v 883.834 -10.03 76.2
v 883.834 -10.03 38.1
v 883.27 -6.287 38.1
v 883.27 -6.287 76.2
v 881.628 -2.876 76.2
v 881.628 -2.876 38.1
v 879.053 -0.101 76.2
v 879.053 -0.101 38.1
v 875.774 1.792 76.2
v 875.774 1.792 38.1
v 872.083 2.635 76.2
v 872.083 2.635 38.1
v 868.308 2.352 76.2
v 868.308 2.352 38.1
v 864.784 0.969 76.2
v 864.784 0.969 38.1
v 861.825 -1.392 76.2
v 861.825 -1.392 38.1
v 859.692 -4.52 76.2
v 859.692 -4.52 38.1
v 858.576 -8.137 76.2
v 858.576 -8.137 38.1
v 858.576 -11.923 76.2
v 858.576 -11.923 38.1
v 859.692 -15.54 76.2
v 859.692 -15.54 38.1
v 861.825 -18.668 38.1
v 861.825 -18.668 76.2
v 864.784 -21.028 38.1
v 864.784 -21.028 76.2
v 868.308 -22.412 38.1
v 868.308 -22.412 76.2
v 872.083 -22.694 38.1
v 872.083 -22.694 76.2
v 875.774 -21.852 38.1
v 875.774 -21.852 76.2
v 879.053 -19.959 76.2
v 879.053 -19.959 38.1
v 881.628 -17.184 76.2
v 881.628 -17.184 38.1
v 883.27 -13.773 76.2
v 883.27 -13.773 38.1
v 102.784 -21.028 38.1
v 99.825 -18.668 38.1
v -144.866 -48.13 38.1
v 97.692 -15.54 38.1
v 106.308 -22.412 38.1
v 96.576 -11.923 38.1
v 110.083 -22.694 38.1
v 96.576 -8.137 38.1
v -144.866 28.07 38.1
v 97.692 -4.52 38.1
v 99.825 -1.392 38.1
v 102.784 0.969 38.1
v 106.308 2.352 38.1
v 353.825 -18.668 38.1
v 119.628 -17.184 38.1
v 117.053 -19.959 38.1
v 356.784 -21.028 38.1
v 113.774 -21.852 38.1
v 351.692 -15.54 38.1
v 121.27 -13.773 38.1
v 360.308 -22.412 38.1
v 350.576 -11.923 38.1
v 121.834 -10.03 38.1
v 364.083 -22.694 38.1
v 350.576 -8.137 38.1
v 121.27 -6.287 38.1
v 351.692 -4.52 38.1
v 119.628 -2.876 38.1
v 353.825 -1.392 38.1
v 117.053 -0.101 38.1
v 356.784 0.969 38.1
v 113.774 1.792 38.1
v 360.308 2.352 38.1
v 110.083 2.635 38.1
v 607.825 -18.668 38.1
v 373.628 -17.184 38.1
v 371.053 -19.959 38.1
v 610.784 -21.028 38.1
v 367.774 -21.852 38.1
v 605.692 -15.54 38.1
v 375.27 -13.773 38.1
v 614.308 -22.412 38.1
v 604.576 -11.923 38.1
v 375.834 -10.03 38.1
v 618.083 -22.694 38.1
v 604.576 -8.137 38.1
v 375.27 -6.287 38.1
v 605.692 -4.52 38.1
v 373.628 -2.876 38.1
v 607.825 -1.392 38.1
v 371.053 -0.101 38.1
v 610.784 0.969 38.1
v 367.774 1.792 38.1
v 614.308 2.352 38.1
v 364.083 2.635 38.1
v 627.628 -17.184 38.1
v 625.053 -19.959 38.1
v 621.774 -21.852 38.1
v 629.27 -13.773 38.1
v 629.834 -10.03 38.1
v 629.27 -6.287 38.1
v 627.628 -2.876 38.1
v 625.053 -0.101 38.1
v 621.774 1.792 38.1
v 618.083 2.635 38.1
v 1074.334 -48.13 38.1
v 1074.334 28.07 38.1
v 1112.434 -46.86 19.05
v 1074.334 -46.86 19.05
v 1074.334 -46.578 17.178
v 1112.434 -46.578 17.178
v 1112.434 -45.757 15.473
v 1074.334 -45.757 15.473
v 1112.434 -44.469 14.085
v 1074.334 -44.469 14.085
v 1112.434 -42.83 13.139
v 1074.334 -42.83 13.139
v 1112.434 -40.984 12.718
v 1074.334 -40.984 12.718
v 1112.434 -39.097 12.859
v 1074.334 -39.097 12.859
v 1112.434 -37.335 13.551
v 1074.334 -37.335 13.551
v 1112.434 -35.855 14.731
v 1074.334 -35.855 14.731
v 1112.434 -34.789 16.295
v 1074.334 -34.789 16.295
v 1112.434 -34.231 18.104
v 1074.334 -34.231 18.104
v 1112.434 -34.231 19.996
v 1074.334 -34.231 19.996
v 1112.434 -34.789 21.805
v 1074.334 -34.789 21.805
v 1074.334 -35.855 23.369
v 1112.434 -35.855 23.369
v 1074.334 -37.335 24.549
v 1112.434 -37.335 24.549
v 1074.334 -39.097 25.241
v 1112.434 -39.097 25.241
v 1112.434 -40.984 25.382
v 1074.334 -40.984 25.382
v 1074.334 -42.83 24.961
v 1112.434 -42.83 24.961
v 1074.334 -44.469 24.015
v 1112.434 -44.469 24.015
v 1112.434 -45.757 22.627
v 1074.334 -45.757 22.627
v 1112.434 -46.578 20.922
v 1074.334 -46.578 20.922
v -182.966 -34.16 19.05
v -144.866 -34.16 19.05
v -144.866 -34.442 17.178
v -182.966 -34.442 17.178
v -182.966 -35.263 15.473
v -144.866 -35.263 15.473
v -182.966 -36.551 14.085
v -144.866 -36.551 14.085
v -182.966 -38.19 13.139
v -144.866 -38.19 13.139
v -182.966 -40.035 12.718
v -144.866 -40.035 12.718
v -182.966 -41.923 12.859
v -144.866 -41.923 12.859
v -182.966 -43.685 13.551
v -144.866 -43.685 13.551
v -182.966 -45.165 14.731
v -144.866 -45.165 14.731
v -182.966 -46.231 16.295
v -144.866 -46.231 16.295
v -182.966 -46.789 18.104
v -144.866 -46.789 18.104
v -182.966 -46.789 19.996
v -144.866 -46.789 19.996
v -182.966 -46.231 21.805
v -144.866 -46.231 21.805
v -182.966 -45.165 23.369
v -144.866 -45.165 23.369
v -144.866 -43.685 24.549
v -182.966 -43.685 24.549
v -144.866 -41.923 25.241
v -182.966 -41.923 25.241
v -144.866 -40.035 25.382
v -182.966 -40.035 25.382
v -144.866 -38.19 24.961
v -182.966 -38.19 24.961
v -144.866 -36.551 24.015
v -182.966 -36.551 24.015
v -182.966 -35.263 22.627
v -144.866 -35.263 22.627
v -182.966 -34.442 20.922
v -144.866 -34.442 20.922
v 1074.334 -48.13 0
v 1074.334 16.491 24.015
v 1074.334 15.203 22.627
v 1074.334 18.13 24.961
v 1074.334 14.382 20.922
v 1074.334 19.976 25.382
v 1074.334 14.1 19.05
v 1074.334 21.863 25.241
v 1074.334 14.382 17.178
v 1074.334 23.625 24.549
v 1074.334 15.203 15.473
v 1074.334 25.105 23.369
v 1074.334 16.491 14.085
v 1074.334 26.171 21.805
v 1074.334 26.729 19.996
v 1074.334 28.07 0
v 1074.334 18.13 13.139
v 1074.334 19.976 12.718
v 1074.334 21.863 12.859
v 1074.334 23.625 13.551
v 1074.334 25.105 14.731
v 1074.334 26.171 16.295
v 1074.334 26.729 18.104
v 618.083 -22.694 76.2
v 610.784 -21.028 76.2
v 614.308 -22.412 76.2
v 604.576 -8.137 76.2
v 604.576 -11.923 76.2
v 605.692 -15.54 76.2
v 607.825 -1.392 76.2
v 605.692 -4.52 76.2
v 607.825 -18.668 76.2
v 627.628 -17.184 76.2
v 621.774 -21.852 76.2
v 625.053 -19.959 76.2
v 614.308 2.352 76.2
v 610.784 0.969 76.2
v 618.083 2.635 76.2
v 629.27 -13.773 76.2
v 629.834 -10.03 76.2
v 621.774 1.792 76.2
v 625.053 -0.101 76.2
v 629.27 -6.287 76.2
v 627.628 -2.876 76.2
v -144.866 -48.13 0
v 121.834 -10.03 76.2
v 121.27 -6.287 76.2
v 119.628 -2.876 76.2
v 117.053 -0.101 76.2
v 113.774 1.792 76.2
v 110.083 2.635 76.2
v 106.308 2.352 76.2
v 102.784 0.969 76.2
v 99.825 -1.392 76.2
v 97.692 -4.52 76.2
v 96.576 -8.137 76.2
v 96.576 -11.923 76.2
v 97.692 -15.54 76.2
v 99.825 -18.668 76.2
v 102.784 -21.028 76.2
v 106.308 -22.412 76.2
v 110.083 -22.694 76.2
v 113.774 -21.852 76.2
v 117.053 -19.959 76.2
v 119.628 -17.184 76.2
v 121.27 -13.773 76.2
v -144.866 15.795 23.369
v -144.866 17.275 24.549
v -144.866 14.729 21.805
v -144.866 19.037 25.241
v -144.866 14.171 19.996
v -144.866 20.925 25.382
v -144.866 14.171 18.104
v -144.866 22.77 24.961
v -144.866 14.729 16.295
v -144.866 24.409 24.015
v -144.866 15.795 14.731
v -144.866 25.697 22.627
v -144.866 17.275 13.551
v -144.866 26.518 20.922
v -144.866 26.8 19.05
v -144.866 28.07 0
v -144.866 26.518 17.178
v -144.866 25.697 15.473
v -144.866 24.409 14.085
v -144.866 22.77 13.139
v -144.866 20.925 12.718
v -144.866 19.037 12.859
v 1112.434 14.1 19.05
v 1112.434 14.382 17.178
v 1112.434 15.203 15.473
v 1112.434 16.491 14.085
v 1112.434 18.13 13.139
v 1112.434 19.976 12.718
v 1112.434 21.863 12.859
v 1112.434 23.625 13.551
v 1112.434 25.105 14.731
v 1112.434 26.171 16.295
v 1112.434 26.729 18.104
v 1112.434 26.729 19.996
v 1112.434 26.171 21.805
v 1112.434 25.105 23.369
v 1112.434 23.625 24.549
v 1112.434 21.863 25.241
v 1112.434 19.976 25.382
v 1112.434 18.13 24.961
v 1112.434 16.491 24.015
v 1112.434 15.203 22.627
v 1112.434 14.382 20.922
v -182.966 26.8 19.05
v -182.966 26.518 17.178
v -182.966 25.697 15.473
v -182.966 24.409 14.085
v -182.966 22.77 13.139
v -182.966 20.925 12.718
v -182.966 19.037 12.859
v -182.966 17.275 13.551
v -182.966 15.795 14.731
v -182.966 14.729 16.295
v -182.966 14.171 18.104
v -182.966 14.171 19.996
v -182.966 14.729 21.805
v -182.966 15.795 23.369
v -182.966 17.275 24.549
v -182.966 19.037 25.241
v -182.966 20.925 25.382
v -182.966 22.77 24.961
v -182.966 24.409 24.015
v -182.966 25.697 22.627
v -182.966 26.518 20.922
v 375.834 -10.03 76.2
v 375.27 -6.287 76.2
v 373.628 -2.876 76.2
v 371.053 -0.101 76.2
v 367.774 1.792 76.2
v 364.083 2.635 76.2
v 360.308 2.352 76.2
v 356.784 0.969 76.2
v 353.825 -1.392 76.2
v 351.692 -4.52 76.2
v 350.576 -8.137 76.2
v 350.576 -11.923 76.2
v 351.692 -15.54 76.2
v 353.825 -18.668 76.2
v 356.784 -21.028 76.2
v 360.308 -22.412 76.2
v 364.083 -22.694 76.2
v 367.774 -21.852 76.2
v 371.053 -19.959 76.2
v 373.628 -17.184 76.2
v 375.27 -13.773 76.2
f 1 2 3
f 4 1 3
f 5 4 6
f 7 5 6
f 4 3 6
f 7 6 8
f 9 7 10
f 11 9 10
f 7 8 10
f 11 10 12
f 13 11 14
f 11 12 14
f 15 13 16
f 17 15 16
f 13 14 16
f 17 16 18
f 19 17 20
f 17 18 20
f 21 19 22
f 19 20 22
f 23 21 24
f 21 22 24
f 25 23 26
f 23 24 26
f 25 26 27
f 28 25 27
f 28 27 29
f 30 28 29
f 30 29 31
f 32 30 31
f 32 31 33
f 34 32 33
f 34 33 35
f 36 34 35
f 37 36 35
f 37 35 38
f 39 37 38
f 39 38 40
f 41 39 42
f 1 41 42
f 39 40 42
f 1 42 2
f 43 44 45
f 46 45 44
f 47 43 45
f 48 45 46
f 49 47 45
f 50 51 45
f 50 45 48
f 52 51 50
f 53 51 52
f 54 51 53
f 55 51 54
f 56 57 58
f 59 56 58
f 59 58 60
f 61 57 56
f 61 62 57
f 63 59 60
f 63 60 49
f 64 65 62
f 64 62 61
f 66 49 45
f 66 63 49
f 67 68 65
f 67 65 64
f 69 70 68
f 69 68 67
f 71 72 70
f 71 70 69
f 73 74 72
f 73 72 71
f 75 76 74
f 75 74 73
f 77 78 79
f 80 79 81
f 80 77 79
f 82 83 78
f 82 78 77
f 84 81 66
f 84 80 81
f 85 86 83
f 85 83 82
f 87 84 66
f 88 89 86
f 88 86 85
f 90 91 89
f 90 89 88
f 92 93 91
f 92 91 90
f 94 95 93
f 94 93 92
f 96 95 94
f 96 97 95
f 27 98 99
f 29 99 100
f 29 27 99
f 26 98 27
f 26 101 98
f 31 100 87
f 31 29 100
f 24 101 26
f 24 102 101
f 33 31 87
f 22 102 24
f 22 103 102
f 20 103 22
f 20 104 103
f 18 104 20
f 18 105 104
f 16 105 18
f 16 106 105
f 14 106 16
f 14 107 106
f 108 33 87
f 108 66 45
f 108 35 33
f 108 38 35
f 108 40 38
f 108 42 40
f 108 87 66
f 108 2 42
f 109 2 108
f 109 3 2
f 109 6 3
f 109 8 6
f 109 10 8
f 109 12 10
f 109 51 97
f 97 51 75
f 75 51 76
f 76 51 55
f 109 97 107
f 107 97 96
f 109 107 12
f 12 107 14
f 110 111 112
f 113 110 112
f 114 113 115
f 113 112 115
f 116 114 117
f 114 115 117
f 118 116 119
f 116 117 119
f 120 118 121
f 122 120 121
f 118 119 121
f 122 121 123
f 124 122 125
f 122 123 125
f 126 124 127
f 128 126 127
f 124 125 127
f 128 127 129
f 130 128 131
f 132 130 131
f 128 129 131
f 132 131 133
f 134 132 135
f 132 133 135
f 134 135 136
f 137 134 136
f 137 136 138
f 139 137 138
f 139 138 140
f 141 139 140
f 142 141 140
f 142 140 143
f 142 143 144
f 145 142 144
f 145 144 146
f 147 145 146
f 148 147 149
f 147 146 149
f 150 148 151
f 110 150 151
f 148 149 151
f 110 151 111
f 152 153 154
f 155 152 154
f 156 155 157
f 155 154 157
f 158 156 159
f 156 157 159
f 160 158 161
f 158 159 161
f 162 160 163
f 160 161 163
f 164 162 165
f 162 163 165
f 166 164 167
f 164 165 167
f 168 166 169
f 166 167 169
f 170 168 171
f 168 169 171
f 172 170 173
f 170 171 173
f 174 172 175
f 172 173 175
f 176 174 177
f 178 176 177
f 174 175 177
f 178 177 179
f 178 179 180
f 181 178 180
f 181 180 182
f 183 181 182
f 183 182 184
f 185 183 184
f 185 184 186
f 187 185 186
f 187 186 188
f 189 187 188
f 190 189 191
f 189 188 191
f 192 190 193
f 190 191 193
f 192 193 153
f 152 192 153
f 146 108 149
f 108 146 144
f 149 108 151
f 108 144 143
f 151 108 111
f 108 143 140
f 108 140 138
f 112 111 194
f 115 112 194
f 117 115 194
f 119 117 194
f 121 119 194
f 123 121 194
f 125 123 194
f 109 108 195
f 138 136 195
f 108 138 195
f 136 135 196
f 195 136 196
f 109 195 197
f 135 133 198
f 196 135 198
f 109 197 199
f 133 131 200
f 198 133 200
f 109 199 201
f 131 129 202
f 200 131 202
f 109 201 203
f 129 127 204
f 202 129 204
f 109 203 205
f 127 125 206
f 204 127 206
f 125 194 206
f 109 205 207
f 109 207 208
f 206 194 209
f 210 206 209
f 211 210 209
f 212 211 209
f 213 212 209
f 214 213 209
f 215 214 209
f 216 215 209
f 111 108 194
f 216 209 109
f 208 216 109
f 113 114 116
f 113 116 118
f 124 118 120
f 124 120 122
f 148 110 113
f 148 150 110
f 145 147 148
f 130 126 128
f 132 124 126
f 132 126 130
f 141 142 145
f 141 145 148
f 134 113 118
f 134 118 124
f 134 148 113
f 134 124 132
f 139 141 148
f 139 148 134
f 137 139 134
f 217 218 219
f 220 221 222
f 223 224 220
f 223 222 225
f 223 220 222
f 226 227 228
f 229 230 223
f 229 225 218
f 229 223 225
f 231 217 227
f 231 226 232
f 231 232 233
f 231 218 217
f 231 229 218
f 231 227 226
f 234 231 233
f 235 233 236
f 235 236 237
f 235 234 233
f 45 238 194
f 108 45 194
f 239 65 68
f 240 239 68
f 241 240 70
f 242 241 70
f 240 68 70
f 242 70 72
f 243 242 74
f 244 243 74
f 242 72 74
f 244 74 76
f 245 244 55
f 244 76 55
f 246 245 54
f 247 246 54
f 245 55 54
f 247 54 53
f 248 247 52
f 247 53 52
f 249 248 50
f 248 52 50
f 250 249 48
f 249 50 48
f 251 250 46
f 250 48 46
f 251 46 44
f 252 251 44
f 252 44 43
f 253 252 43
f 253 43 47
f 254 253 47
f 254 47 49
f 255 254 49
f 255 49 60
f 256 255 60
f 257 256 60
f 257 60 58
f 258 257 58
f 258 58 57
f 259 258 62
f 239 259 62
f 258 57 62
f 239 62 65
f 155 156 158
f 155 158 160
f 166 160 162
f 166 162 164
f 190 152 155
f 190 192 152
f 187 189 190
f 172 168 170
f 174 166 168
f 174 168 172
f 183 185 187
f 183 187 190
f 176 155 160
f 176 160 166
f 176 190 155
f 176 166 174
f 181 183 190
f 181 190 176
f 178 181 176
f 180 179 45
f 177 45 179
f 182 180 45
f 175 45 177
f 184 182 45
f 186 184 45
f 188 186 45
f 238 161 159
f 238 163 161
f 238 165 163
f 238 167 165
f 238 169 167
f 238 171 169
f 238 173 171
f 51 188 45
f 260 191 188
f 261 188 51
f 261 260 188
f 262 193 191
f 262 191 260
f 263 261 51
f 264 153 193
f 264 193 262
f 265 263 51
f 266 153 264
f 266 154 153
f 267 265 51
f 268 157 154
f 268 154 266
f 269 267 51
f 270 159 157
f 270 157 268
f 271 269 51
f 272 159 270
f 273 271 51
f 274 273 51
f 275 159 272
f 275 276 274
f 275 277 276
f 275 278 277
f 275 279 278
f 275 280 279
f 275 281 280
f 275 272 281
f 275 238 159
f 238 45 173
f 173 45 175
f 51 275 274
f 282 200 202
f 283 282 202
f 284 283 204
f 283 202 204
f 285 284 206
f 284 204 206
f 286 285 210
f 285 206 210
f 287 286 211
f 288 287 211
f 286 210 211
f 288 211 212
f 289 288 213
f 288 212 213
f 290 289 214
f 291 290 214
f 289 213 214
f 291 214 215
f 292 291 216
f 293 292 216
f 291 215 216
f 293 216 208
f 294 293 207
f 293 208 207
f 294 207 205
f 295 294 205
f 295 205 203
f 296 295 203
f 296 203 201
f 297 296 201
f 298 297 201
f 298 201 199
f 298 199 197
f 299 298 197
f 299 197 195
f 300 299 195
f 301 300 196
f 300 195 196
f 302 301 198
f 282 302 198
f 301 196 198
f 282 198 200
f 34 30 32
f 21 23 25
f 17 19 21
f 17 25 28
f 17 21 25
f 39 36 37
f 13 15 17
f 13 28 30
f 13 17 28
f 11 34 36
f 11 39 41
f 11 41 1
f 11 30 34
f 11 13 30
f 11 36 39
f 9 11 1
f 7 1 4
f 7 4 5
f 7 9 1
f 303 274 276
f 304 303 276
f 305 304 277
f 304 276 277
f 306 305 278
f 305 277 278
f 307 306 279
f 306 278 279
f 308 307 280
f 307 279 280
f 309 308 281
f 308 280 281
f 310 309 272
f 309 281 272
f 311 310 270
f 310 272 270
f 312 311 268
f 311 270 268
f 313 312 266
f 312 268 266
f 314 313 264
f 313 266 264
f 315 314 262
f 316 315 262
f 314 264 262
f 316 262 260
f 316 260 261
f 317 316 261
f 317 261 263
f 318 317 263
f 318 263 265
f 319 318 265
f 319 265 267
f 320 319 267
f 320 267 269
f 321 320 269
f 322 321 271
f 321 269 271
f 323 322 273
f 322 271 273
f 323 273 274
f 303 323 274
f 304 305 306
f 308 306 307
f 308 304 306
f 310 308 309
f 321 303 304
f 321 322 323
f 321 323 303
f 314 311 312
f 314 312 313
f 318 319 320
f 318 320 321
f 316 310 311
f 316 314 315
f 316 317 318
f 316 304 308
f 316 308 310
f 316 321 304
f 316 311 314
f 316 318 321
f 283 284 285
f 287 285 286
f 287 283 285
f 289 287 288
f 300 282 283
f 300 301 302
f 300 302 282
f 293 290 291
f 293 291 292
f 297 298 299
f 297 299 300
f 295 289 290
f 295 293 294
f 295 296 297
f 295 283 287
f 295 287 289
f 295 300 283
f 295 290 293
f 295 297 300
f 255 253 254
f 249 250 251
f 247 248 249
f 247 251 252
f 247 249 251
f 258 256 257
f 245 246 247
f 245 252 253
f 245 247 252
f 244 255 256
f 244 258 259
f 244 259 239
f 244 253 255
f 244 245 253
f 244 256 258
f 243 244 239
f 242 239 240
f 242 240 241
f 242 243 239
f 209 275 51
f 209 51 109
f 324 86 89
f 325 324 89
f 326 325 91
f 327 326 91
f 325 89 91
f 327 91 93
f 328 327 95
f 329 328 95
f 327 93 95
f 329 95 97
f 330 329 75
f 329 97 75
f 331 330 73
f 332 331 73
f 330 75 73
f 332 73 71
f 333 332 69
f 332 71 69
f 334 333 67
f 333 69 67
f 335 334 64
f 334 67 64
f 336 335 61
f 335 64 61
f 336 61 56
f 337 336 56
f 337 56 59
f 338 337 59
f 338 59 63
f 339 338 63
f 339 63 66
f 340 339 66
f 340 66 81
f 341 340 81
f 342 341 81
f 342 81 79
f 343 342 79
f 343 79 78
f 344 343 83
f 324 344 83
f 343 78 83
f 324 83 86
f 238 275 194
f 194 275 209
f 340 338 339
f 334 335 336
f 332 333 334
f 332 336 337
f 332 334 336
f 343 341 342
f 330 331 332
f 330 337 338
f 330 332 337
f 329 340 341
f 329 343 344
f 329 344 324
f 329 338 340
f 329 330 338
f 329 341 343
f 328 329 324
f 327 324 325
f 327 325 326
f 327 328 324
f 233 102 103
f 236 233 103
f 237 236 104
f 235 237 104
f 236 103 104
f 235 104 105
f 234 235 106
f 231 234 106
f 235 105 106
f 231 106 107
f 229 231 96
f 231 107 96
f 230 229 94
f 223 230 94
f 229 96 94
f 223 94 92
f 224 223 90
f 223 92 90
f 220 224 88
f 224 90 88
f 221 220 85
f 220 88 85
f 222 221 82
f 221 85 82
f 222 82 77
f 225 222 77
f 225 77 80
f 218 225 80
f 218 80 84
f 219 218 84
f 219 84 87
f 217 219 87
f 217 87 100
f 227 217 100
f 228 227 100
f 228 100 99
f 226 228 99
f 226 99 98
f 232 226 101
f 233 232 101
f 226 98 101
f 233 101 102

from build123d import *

# Parameters (mm, degrees)
F0_W     = 1219.2
F0_H     = 76.2
F1_DEPTH = 38.1
F2_R     = 12.7
F3_DEPTH = 38.1
F5_DEPTH = 38.1
F7_DEPTH = 38.1


with BuildPart() as f1:
    # F0 (on Top) → F1 (new body)
    with BuildSketch(Plane.XY):
        with Locations((464.734342, -10.029948)):
            Rectangle(F0_W, F0_H)
    extrude(amount=F1_DEPTH)

    # F2 (on face) → F3 (join)
    with BuildSketch(Plane.XY.offset(38.1)):
        with Locations((109.134342, -10.029948)):
            Circle(F2_R)
        with Locations((363.134342, -10.029948)):
            Circle(F2_R)
        with Locations((617.134342, -10.029948)):
            Circle(F2_R)
        with Locations((871.134342, -10.029948)):
            Circle(F2_R)
    extrude(amount=F3_DEPTH)

    # F4 (on face) → F5 (join)
    with BuildSketch(Plane(origin=(-144.865658, 0, 0), x_dir=(0, -1, 0), z_dir=(-1, 0, 0))):
        with BuildLine():
            ThreePointArc((-14.100052, 19.05), (-20.450052, 25.4), (-26.800052, 19.05))
            Line((-26.800052, 19.05), (-14.100052, 19.05))
        make_face()
        with BuildLine():
            ThreePointArc((46.859948, 19.05), (40.509948, 25.4), (34.159948, 19.05))
            Line((34.159948, 19.05), (46.859948, 19.05))
        make_face()
        with BuildLine():
            Line((46.859948, 19.05), (34.159948, 19.05))
            ThreePointArc((34.159948, 19.05), (40.509948, 12.7), (46.859948, 19.05))
        make_face()
        with BuildLine():
            Line((-14.100052, 19.05), (-26.800052, 19.05))
            ThreePointArc((-26.800052, 19.05), (-20.450052, 12.7), (-14.100052, 19.05))
        make_face()
    extrude(amount=F5_DEPTH)

    # F6 (on face) → F7 (join)
    with BuildSketch(Plane.YZ.offset(1074.334342)):
        with BuildLine():
            ThreePointArc((-34.159948, 19.05), (-40.509948, 25.4), (-46.859948, 19.05))
            Line((-46.859948, 19.05), (-34.159948, 19.05))
        make_face()
        with BuildLine():
            ThreePointArc((26.800052, 19.05), (20.450052, 25.4), (14.100052, 19.05))
            Line((14.100052, 19.05), (26.800052, 19.05))
        make_face()
        with BuildLine():
            Line((26.800052, 19.05), (14.100052, 19.05))
            ThreePointArc((14.100052, 19.05), (20.450052, 12.7), (26.800052, 19.05))
        make_face()
        with BuildLine():
            Line((-34.159948, 19.05), (-46.859948, 19.05))
            ThreePointArc((-46.859948, 19.05), (-40.509948, 12.7), (-34.159948, 19.05))
        make_face()
    extrude(amount=F7_DEPTH)


solid = f1.part
